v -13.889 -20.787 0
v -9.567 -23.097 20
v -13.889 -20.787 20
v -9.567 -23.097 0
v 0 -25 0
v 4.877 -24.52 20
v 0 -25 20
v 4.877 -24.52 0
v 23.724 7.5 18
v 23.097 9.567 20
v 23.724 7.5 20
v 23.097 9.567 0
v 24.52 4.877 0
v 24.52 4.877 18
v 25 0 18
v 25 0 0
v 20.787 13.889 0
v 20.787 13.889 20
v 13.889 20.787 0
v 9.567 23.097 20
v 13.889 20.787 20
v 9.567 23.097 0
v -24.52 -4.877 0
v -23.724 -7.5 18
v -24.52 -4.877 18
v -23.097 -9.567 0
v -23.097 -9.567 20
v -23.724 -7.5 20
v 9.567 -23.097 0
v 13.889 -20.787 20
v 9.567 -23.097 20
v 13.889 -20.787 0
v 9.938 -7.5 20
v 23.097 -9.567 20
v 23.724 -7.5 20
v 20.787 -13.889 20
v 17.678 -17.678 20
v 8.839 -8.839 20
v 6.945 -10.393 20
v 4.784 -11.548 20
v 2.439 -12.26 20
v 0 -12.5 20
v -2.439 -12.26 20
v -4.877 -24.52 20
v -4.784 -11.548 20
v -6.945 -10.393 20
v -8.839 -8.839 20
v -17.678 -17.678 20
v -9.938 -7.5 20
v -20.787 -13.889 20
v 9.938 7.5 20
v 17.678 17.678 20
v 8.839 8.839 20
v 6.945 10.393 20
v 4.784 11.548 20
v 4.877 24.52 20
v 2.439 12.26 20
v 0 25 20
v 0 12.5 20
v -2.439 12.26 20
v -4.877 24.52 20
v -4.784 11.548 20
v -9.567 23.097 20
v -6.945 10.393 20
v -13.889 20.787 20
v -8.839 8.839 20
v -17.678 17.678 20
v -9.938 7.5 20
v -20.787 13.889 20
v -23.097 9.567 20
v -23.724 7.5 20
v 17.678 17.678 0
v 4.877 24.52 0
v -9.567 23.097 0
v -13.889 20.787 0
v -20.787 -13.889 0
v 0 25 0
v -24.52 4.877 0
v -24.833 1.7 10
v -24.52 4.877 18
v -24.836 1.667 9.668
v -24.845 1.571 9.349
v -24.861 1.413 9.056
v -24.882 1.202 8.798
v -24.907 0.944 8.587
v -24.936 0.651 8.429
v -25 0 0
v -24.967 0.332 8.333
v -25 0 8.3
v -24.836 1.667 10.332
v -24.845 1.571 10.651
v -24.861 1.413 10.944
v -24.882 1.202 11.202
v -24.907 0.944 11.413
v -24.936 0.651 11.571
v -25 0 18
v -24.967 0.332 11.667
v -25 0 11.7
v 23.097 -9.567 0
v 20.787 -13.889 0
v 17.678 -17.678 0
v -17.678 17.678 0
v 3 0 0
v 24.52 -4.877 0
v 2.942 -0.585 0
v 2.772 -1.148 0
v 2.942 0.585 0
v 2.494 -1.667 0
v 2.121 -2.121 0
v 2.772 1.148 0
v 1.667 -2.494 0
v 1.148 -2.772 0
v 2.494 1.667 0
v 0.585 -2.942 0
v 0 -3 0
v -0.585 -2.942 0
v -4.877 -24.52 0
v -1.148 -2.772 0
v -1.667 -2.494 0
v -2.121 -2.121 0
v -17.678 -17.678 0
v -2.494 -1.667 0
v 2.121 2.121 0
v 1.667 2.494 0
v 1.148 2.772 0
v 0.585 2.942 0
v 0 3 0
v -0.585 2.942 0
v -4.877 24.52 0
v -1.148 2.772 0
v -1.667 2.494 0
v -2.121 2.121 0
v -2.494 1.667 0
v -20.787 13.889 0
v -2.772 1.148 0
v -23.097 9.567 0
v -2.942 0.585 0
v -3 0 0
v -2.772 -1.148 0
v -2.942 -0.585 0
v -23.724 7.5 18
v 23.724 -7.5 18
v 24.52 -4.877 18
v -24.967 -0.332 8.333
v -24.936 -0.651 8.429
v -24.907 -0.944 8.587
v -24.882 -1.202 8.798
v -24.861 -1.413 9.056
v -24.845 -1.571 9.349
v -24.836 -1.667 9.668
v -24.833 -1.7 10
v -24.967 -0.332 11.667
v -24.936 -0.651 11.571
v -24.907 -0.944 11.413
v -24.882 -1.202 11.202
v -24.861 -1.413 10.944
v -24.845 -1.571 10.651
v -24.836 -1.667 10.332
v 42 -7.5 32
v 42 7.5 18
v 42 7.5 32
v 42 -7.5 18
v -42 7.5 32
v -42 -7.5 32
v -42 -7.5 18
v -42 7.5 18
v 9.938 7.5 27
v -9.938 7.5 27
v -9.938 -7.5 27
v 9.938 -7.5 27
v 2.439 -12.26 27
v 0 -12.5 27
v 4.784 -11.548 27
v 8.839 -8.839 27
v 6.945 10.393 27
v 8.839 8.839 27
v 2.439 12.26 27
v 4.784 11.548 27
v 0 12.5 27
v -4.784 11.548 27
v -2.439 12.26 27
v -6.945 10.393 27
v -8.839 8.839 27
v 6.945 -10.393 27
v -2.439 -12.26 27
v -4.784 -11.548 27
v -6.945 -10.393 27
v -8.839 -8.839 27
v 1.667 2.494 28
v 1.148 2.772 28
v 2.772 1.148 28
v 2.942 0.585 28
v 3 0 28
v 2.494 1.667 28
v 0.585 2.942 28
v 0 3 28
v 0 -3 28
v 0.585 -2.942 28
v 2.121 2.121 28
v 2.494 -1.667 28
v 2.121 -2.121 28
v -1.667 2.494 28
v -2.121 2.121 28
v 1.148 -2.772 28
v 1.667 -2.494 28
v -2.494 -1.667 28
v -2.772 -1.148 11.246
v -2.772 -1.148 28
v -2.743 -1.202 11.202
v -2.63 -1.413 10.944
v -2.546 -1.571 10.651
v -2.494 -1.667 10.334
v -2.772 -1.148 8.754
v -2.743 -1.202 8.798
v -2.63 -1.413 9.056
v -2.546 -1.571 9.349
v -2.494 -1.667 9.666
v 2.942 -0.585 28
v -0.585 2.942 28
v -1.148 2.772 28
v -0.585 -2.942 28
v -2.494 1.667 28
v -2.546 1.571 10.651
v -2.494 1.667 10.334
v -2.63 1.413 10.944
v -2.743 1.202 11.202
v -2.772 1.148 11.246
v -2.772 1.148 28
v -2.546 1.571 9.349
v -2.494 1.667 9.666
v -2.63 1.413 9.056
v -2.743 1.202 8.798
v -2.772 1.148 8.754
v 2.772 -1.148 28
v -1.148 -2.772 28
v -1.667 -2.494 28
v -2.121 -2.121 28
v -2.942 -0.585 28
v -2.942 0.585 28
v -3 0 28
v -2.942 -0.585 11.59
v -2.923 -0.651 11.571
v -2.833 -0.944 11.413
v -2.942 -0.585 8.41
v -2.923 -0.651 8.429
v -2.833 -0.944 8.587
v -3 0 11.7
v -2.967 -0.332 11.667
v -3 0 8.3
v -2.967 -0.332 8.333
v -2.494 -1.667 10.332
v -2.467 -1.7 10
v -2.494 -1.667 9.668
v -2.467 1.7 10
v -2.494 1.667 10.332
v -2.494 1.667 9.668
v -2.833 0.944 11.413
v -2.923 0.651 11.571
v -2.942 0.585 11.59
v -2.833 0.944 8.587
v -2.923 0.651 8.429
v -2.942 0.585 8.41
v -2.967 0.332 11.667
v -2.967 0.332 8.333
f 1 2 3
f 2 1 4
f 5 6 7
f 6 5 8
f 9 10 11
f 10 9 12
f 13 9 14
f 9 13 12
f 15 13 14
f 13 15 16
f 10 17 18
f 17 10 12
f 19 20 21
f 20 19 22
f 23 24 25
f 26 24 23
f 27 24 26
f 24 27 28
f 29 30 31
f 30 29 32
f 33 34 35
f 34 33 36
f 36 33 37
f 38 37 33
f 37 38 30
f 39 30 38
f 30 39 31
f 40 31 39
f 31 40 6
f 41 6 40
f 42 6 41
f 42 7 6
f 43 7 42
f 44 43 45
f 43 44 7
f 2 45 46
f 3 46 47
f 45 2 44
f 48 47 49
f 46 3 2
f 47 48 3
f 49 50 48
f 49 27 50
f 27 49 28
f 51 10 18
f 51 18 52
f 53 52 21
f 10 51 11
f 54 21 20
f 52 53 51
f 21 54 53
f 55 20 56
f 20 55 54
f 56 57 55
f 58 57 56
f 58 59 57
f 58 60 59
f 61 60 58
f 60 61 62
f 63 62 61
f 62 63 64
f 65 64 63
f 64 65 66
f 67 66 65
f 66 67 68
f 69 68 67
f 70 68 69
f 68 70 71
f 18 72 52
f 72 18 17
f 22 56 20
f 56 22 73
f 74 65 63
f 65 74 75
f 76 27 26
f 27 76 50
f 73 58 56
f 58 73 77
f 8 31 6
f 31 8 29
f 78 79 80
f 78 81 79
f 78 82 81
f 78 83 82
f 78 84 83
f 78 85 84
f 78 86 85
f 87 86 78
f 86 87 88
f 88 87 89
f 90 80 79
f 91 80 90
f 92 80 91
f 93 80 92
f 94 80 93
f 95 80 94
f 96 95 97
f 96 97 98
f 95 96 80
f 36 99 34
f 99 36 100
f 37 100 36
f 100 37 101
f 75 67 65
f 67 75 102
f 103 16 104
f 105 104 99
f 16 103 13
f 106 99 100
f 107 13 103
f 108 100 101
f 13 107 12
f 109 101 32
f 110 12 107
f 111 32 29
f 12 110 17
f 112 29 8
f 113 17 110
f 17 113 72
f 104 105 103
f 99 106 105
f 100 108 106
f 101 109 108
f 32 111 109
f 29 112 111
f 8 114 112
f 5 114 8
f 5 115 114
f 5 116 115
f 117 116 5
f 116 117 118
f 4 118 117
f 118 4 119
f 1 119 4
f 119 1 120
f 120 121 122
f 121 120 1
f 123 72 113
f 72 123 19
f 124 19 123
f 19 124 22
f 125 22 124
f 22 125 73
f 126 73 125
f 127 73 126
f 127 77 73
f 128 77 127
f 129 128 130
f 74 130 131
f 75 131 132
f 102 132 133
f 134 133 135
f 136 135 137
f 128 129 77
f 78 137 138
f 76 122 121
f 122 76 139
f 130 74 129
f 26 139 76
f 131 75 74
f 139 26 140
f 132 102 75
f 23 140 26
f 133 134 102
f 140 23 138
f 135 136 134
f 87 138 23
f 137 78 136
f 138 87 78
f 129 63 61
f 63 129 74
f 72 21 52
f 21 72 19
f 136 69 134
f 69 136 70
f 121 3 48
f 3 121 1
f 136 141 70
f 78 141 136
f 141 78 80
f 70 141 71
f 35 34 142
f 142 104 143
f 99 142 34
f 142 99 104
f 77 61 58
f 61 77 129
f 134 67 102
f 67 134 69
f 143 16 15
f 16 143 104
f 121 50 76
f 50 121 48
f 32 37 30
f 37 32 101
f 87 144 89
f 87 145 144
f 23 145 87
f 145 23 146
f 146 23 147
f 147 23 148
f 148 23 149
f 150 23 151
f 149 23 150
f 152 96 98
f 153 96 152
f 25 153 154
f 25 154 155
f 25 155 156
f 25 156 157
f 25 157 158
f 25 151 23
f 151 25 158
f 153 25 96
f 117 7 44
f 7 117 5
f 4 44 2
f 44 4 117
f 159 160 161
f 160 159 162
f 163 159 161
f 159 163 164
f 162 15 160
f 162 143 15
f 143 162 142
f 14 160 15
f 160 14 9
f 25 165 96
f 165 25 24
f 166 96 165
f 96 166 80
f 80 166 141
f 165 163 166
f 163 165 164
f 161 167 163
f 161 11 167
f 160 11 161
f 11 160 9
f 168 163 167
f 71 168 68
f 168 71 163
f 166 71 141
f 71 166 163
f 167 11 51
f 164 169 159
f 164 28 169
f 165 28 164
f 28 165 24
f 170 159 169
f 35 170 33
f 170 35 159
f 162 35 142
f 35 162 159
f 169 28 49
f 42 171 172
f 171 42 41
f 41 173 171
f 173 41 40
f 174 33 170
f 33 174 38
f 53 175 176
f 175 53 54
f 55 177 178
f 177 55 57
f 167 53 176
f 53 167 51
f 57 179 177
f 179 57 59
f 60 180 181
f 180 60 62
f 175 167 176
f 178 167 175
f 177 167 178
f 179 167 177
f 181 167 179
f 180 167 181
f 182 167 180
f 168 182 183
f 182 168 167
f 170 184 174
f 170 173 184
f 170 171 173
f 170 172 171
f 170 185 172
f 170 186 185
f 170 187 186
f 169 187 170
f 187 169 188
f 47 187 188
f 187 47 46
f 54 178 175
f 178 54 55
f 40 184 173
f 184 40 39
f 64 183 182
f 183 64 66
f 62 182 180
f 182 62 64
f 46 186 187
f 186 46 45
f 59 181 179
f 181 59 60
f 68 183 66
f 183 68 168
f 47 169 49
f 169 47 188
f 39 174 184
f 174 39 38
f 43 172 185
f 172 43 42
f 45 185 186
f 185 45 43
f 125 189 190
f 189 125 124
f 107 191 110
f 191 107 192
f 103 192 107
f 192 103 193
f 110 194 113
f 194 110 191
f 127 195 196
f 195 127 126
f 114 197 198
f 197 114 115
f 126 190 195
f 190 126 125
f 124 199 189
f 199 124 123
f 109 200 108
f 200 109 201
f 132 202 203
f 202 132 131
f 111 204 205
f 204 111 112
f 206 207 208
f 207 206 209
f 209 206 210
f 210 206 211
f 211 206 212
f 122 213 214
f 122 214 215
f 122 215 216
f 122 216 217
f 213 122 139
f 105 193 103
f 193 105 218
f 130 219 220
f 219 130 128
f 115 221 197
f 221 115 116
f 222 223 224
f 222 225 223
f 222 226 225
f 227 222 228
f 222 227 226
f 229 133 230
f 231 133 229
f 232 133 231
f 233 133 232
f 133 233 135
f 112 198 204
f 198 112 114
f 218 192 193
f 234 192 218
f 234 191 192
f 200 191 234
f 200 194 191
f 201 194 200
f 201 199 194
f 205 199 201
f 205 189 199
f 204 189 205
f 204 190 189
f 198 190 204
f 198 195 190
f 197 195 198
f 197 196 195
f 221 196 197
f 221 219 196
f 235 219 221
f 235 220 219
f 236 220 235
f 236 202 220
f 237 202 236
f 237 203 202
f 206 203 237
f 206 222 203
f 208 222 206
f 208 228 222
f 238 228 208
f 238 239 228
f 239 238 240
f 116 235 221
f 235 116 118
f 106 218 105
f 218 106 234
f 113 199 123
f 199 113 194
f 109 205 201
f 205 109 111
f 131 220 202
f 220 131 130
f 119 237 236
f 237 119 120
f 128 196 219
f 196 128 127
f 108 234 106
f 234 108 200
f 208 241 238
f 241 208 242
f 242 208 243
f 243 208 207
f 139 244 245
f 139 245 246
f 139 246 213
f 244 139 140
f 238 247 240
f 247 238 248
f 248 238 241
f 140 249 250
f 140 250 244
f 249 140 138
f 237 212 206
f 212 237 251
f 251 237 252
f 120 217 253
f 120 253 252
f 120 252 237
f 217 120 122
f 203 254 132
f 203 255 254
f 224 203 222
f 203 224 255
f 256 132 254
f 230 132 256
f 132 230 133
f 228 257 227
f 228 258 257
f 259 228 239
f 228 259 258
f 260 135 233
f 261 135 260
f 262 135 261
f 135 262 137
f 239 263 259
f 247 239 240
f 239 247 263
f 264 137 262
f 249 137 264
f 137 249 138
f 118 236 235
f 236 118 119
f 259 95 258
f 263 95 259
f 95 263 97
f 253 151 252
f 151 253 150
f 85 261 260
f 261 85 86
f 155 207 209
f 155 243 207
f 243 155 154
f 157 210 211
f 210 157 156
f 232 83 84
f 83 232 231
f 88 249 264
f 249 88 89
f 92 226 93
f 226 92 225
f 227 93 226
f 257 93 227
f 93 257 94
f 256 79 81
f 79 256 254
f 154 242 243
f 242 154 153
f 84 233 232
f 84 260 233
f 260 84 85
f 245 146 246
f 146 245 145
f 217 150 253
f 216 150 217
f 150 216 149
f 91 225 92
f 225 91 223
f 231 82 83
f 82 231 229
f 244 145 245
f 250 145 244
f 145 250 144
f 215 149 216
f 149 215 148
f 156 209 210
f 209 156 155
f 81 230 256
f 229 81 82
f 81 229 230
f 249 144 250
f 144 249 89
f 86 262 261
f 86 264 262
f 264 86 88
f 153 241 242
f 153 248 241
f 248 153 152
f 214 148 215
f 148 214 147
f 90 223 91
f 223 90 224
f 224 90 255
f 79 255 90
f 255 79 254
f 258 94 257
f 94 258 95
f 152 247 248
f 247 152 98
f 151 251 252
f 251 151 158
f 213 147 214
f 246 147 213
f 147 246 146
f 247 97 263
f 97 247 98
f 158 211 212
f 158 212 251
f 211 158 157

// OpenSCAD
$fn = 32;

// ----------------------------------------------------------------------
// Hand knob: 50 x 84 x 27 mm
// ----------------------------------------------------------------------

// --- parameters (mm) ---
grip_d = 50;              // knob diameter
grip_h = 20;              // knob height
shaft_d = 6;              // shaft bore
set_d = 3.4;              // set screw tap hole
wing_l = 84;              // wing span
wing_w = 15;              // wing width
wing_h = 12;              // wing thickness
cap_h = 7;                // raised centre cap
cap_d = 25;               // centre cap diameter

module body() {
  cylinder(h = grip_h, d = grip_d);
}

module wing() {
  /* wing sunk 2 mm into the knob so the joint overlaps */
  translate([-wing_l / 2, -wing_w / 2, grip_h - 2])
    cube([wing_l, wing_w, wing_h + 2]);
}

module cap() {
  translate([0, 0, grip_h - 1]) cylinder(h = cap_h + 1, d = cap_d);
}

difference() {
  union() {
    body();
    wing();
    cap();
  }
  translate([0, 0, -1]) cylinder(h = grip_h + cap_h + 2, d = shaft_d);
  translate([-grip_d / 2 - 1, 0, grip_h * 0.5]) rotate([0, 90, 0]) cylinder(h = grip_d / 2 + 2, d = set_d);
}
